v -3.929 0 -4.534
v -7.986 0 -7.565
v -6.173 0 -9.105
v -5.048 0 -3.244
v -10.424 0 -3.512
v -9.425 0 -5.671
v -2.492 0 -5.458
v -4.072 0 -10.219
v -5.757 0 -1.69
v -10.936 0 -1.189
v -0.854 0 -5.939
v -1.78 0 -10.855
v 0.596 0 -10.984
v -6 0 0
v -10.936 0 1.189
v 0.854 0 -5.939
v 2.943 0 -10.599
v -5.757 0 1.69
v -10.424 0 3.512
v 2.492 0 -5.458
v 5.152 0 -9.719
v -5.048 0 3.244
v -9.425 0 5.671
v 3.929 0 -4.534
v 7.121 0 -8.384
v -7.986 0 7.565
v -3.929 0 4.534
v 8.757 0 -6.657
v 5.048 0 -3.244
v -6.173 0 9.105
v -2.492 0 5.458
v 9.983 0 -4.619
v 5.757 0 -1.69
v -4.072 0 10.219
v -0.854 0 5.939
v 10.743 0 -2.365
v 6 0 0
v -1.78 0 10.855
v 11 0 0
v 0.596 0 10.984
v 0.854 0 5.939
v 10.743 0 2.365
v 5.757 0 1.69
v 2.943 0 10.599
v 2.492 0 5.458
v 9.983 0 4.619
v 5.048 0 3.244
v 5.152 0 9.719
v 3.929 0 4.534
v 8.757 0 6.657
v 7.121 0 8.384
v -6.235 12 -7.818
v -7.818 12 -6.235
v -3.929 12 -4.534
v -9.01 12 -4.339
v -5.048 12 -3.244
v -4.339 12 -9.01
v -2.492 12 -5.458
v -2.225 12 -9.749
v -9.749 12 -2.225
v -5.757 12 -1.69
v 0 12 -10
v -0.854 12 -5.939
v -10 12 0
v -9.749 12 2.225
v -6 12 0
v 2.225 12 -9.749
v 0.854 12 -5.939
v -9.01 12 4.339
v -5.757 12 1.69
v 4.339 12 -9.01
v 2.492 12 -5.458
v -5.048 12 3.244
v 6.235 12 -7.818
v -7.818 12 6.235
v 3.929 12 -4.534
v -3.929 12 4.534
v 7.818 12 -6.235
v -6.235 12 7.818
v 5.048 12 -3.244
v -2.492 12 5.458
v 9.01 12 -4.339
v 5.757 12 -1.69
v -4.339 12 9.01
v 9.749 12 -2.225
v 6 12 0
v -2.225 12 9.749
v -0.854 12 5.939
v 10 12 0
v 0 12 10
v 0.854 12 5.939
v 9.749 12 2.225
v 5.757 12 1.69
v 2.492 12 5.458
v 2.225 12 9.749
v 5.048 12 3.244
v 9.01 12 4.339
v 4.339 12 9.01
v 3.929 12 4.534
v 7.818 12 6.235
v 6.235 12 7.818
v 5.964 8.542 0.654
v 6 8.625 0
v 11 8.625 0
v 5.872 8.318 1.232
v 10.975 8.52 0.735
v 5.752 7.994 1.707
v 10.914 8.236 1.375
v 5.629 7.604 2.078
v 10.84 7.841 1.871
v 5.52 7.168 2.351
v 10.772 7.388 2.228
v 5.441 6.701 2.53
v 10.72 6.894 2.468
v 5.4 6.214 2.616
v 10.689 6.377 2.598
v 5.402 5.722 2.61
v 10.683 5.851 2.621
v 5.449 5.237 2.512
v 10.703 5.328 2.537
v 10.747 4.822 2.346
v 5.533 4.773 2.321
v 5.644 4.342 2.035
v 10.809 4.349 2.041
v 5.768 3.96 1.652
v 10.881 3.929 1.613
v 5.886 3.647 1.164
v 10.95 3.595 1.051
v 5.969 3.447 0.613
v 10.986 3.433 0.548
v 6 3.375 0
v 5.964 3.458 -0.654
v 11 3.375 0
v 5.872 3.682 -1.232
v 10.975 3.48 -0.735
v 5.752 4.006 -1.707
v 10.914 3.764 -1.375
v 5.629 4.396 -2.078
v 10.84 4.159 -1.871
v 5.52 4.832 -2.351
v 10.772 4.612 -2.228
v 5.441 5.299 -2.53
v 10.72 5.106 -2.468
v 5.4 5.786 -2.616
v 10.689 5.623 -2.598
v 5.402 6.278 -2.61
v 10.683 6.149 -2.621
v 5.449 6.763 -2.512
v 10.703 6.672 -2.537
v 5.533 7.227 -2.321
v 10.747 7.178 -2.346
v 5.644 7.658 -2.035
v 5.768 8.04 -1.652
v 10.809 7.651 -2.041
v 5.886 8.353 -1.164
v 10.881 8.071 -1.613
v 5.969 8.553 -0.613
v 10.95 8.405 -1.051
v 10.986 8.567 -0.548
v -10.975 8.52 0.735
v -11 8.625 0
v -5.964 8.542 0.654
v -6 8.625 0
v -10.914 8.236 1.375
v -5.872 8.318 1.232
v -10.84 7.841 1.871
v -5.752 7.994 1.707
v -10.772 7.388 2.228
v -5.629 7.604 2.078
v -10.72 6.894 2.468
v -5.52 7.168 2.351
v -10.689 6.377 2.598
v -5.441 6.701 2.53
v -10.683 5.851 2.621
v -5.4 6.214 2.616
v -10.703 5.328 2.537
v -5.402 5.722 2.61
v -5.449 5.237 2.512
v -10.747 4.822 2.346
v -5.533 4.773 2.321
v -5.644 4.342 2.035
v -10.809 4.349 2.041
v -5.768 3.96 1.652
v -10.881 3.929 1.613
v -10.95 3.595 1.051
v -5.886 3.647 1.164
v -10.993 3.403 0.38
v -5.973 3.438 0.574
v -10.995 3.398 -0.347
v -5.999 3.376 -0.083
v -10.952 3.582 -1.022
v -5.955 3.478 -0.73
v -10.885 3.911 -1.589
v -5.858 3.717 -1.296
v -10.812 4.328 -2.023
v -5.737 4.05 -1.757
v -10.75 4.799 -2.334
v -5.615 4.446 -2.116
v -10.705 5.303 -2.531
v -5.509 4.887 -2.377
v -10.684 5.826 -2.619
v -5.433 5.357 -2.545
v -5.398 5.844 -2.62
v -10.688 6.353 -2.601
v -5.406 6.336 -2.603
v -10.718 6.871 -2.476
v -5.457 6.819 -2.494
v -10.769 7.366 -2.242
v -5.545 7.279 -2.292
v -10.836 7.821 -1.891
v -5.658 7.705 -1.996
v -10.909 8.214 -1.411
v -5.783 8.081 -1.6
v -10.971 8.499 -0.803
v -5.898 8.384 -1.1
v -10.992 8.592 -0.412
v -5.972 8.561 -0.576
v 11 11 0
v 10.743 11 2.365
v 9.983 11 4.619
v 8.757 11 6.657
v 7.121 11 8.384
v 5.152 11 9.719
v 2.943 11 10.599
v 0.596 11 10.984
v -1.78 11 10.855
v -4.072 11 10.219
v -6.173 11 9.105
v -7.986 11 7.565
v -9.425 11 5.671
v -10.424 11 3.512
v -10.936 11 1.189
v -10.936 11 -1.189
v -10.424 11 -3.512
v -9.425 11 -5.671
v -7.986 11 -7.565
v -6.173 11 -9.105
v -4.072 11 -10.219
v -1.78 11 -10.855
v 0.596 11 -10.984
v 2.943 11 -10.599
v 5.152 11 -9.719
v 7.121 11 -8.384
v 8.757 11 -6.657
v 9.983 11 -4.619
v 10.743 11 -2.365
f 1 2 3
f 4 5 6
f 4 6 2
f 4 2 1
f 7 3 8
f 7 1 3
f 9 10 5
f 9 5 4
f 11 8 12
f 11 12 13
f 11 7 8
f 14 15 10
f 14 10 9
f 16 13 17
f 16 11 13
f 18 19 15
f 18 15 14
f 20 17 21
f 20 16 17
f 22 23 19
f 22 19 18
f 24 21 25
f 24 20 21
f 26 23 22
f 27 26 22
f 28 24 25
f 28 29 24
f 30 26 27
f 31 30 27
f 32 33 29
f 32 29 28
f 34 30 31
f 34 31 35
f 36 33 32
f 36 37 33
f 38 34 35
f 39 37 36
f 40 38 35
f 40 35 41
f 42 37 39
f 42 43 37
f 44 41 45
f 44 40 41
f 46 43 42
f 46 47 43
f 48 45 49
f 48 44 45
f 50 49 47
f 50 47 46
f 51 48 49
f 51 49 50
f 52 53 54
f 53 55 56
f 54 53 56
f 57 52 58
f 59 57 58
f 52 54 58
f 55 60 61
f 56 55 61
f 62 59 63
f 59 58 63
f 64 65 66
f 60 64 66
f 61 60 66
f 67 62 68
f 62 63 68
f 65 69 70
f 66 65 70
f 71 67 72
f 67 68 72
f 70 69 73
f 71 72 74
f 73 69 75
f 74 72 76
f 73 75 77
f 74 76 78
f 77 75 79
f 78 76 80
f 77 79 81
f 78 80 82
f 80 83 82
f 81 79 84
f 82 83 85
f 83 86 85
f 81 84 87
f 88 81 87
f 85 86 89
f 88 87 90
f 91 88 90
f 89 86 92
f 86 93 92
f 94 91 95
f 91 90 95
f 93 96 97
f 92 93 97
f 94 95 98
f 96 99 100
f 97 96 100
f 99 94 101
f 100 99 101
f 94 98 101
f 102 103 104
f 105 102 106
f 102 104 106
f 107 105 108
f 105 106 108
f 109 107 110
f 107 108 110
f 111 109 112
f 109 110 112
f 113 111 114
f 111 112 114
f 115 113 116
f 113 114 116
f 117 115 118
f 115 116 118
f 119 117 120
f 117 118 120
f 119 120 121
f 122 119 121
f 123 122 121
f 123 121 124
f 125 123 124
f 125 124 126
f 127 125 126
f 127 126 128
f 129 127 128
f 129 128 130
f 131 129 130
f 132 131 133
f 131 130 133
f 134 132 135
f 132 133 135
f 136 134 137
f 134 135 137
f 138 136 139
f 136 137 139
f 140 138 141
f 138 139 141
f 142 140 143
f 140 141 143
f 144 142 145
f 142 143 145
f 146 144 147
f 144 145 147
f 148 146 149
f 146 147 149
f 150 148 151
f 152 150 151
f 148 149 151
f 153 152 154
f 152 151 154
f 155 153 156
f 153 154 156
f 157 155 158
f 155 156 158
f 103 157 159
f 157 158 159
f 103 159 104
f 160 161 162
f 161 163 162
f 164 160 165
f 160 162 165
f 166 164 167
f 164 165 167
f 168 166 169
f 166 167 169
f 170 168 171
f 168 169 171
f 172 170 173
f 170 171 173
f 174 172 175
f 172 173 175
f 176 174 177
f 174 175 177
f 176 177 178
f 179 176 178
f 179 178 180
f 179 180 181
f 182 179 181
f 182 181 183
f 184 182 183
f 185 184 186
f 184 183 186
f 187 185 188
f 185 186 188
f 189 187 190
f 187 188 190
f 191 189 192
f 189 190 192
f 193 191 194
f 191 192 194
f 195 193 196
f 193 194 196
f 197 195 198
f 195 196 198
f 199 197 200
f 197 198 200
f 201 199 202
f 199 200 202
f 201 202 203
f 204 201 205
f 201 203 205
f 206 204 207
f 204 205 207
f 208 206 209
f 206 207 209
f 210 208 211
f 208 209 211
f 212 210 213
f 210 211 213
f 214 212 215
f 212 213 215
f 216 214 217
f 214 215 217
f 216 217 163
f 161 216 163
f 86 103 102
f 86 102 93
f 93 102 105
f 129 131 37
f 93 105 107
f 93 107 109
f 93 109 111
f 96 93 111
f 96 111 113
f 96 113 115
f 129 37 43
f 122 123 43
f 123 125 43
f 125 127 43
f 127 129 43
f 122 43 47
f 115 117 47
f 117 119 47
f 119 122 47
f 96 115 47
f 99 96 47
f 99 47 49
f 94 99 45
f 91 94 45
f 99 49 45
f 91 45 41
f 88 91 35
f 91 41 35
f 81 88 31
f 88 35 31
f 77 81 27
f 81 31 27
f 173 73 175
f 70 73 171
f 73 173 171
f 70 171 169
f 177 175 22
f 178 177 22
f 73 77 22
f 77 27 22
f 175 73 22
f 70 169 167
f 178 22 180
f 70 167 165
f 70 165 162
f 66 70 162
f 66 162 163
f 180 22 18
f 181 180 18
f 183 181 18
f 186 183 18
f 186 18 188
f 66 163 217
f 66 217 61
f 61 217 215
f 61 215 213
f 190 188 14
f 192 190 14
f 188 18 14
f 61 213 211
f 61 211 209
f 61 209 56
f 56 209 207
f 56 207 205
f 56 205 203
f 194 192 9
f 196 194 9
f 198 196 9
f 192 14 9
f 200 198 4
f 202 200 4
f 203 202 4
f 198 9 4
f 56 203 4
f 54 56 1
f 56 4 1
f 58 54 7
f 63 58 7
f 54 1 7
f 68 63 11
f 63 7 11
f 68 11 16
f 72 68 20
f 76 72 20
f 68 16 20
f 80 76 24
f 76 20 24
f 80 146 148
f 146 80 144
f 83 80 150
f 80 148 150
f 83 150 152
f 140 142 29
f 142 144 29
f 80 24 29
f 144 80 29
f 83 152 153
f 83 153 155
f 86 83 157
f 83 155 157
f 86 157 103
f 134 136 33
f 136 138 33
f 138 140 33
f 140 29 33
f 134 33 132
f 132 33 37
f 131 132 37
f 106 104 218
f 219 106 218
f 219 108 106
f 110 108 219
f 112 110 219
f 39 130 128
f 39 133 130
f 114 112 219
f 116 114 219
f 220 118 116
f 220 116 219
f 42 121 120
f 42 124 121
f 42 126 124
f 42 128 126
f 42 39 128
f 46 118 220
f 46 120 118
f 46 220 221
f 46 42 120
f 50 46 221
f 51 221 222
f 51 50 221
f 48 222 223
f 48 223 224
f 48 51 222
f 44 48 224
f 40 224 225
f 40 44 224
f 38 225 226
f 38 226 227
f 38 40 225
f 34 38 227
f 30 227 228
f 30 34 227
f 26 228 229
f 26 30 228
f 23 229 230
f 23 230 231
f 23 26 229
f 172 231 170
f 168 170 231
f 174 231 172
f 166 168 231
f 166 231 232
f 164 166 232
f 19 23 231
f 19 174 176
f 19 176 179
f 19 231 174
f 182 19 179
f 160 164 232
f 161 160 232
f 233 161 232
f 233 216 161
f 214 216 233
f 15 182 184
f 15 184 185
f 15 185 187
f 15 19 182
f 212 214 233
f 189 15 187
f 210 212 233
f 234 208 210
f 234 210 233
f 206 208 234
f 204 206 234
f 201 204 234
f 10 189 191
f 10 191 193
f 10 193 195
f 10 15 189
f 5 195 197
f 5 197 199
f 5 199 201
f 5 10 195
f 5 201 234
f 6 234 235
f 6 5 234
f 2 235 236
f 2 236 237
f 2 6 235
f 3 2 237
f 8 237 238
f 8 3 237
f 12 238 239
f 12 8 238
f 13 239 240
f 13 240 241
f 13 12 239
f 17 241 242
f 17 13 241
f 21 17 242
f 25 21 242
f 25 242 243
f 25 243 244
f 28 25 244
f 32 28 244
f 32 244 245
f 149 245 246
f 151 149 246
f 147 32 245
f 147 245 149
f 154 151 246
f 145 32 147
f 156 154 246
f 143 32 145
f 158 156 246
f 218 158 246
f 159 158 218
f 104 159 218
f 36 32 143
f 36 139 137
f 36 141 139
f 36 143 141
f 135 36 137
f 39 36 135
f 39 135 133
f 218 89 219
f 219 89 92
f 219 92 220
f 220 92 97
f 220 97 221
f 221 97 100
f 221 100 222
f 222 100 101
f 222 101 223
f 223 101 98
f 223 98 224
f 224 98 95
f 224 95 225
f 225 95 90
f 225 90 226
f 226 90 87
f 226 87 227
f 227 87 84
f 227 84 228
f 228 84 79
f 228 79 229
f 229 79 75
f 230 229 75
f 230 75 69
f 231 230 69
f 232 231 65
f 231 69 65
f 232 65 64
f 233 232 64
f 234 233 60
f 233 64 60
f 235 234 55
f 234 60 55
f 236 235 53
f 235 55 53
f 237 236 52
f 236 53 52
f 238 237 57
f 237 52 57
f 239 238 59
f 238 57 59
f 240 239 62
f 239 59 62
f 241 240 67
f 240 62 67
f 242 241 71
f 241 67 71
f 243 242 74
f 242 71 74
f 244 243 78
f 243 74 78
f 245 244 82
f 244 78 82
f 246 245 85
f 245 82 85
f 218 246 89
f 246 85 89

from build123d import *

# Parameters (mm, degrees)
F0_R     = 11
F0_R_2   = 6
F1_DEPTH = 12
F2_SIZE  = 1
F3_R     = 2.625
F4_DEPTH = 12.5


with BuildPart() as f1:
    # F0 (on Front) → F1 (new body)
    with BuildSketch(Plane.XZ):
        Circle(F0_R)
        Circle(F0_R_2, mode=Mode.SUBTRACT)
    extrude(amount=-F1_DEPTH)

    # F2
    f2_edges = [f1.edges().sort_by_distance(p)[0] for p in [
        (-11, 12, 0),
    ]]
    chamfer(f2_edges, length=F2_SIZE)

    # F3 (on Right) → F4 (cut, symmetric)
    with BuildSketch(Plane.YZ):
        with Locations((6, 0)):
            Circle(F3_R)
    extrude(amount=F4_DEPTH, both=True, mode=Mode.SUBTRACT)


solid = f1.part
